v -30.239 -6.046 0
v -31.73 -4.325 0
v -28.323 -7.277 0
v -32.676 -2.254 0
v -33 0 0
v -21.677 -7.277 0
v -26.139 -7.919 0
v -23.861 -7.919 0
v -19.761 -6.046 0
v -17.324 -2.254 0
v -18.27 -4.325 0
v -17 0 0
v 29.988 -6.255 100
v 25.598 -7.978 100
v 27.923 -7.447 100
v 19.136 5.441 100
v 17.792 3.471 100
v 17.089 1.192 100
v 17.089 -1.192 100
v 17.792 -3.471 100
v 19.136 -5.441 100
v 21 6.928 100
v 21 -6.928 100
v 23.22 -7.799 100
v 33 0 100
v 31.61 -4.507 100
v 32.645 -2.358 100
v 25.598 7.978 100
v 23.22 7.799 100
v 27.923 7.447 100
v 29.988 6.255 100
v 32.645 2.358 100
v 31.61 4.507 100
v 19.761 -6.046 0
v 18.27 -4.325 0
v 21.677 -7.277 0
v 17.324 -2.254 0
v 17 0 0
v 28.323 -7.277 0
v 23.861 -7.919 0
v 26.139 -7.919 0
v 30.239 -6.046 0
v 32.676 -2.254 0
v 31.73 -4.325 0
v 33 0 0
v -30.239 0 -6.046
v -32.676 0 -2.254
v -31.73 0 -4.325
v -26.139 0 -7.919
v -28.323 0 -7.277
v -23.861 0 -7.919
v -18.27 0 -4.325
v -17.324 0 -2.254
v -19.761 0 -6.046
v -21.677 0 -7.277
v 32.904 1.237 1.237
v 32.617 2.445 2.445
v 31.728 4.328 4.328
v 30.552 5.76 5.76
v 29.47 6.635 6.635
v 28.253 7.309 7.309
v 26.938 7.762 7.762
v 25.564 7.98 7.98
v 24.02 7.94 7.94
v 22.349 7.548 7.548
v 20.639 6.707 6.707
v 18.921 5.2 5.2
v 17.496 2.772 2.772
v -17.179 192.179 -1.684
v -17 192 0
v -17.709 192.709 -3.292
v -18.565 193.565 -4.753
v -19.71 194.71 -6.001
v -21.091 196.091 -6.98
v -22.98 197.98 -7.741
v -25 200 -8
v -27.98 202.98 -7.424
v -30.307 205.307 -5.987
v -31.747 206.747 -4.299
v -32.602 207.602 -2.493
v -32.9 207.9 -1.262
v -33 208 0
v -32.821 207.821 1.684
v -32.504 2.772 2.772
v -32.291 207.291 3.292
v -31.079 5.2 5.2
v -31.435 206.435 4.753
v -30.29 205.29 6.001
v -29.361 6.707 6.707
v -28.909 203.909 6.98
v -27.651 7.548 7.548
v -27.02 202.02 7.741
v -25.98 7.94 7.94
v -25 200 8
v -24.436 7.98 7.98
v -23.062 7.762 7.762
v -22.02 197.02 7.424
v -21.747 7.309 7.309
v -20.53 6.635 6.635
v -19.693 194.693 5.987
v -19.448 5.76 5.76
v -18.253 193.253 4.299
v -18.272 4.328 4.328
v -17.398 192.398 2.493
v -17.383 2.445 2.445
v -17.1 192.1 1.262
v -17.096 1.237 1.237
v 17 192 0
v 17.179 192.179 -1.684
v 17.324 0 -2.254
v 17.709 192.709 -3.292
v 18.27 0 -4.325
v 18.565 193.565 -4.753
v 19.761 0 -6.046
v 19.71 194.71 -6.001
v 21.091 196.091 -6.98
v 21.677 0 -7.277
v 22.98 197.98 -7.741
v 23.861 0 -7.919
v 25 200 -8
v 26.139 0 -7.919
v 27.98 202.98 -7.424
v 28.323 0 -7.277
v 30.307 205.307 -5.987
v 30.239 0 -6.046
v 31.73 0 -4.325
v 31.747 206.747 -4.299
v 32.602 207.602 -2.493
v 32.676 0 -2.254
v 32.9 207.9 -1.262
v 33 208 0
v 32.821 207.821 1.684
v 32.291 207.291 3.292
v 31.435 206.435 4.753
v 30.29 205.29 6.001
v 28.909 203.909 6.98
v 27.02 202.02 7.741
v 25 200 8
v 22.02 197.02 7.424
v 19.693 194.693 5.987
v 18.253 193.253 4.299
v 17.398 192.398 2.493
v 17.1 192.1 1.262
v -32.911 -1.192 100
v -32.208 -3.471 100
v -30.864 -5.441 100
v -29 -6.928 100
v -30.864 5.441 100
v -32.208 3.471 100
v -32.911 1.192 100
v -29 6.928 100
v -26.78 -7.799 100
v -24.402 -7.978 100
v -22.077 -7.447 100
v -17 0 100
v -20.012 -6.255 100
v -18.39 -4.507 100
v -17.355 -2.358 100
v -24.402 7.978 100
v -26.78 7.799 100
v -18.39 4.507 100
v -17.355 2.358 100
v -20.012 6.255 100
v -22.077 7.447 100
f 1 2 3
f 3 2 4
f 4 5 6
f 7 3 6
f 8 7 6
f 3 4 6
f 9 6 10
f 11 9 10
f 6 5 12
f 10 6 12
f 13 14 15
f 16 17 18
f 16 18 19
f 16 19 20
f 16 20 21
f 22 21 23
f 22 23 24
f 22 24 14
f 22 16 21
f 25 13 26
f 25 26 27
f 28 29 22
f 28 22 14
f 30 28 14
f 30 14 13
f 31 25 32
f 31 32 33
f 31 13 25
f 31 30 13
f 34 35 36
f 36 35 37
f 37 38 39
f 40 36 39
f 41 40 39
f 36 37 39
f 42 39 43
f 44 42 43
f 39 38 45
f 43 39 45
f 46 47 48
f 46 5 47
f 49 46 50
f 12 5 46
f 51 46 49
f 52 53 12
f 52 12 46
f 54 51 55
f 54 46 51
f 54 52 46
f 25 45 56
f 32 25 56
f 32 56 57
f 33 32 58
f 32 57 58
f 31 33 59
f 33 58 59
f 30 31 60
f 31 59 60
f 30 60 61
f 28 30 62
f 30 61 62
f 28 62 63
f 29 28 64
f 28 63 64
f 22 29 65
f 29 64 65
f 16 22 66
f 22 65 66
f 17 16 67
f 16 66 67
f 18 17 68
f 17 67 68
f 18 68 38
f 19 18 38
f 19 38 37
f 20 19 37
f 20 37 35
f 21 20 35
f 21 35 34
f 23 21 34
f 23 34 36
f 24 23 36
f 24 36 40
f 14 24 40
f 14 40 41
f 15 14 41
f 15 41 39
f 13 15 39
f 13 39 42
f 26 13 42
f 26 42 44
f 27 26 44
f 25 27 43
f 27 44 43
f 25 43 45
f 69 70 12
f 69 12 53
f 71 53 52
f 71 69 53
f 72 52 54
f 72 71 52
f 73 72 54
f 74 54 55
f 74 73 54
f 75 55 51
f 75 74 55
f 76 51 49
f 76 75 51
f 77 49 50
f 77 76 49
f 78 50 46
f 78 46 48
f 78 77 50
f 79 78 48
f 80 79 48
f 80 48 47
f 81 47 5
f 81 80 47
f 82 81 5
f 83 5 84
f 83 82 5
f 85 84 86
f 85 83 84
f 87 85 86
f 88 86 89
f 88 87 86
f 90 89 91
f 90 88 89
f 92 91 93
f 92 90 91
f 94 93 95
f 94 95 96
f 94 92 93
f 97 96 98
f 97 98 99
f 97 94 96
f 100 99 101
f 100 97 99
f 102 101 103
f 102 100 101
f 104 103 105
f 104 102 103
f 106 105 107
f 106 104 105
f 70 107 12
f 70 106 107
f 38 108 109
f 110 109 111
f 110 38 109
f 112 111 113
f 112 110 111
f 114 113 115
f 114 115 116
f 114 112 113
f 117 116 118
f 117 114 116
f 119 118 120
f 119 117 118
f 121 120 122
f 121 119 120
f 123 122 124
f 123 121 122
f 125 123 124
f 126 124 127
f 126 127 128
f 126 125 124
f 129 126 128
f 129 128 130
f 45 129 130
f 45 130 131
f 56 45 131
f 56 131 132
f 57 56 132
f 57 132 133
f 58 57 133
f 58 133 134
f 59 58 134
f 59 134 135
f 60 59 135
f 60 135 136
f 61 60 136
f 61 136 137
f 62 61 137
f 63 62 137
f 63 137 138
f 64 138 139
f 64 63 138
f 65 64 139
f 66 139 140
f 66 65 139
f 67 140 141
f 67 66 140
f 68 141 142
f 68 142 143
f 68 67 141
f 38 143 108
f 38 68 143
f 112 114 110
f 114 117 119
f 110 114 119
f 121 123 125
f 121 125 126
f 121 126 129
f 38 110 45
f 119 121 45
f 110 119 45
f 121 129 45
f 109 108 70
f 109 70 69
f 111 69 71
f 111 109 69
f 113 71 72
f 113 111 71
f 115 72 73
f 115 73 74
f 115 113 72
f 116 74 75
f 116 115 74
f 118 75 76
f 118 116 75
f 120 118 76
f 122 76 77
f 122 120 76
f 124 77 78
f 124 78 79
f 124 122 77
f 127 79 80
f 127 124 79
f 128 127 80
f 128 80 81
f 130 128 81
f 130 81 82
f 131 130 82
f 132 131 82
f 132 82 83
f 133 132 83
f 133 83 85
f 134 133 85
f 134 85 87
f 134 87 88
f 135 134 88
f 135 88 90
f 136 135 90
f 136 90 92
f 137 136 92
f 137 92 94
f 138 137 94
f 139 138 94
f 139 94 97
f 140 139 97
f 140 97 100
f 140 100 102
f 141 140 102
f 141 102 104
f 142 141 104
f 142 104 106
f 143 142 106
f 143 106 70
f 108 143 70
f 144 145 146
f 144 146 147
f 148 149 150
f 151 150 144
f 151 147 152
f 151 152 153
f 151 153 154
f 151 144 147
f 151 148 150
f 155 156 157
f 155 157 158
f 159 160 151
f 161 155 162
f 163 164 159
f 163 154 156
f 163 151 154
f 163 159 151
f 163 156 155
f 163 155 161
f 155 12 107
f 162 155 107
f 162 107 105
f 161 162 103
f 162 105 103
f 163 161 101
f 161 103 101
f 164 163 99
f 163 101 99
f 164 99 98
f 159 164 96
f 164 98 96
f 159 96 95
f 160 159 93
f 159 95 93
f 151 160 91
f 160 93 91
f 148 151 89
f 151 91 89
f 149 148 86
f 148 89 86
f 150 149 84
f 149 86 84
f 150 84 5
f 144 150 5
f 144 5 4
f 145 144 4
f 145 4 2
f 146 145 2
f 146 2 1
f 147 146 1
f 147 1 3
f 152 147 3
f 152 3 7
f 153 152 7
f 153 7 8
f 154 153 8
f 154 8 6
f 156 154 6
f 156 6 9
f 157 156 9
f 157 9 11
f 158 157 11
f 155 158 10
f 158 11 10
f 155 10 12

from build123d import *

# Parameters (mm, degrees)
F1_R     = 8
F3_DEPTH = 100
F2_R     = 8


with BuildPart() as f3:
    # F1 (on Top) → F3 (new body)
    with BuildSketch(Plane.XY):
        with Locations((-25, 0)):
            Circle(F1_R)
    extrude(amount=F3_DEPTH)



with BuildPart() as f3b:
    # F1 (on Top) → F3, piece 2 (new body)
    with BuildSketch(Plane.XY):
        with Locations((25, 0)):
            Circle(F1_R)
    extrude(amount=F3_DEPTH)


with BuildPart() as f3_1:
    add(f3.part)

    add(f3b.part)  # F4 merges F3b
    # F4: sweep along a path in F0
    with BuildLine(Plane.XY) as f4_path:
        Line((-25, 0), (-25, 200))
        Line((-25, 200), (0, 200))
        Line((0, 200), (25, 200))
        Line((25, 200), (25, 0))
    # F2 (on Front) → F4 (sweep)
    with BuildSketch(Plane.XZ):
        with Locations((-25, 0)):
            Circle(F2_R)
    sweep(path=f4_path.line, transition=Transition.RIGHT)


solid = f3_1.part
